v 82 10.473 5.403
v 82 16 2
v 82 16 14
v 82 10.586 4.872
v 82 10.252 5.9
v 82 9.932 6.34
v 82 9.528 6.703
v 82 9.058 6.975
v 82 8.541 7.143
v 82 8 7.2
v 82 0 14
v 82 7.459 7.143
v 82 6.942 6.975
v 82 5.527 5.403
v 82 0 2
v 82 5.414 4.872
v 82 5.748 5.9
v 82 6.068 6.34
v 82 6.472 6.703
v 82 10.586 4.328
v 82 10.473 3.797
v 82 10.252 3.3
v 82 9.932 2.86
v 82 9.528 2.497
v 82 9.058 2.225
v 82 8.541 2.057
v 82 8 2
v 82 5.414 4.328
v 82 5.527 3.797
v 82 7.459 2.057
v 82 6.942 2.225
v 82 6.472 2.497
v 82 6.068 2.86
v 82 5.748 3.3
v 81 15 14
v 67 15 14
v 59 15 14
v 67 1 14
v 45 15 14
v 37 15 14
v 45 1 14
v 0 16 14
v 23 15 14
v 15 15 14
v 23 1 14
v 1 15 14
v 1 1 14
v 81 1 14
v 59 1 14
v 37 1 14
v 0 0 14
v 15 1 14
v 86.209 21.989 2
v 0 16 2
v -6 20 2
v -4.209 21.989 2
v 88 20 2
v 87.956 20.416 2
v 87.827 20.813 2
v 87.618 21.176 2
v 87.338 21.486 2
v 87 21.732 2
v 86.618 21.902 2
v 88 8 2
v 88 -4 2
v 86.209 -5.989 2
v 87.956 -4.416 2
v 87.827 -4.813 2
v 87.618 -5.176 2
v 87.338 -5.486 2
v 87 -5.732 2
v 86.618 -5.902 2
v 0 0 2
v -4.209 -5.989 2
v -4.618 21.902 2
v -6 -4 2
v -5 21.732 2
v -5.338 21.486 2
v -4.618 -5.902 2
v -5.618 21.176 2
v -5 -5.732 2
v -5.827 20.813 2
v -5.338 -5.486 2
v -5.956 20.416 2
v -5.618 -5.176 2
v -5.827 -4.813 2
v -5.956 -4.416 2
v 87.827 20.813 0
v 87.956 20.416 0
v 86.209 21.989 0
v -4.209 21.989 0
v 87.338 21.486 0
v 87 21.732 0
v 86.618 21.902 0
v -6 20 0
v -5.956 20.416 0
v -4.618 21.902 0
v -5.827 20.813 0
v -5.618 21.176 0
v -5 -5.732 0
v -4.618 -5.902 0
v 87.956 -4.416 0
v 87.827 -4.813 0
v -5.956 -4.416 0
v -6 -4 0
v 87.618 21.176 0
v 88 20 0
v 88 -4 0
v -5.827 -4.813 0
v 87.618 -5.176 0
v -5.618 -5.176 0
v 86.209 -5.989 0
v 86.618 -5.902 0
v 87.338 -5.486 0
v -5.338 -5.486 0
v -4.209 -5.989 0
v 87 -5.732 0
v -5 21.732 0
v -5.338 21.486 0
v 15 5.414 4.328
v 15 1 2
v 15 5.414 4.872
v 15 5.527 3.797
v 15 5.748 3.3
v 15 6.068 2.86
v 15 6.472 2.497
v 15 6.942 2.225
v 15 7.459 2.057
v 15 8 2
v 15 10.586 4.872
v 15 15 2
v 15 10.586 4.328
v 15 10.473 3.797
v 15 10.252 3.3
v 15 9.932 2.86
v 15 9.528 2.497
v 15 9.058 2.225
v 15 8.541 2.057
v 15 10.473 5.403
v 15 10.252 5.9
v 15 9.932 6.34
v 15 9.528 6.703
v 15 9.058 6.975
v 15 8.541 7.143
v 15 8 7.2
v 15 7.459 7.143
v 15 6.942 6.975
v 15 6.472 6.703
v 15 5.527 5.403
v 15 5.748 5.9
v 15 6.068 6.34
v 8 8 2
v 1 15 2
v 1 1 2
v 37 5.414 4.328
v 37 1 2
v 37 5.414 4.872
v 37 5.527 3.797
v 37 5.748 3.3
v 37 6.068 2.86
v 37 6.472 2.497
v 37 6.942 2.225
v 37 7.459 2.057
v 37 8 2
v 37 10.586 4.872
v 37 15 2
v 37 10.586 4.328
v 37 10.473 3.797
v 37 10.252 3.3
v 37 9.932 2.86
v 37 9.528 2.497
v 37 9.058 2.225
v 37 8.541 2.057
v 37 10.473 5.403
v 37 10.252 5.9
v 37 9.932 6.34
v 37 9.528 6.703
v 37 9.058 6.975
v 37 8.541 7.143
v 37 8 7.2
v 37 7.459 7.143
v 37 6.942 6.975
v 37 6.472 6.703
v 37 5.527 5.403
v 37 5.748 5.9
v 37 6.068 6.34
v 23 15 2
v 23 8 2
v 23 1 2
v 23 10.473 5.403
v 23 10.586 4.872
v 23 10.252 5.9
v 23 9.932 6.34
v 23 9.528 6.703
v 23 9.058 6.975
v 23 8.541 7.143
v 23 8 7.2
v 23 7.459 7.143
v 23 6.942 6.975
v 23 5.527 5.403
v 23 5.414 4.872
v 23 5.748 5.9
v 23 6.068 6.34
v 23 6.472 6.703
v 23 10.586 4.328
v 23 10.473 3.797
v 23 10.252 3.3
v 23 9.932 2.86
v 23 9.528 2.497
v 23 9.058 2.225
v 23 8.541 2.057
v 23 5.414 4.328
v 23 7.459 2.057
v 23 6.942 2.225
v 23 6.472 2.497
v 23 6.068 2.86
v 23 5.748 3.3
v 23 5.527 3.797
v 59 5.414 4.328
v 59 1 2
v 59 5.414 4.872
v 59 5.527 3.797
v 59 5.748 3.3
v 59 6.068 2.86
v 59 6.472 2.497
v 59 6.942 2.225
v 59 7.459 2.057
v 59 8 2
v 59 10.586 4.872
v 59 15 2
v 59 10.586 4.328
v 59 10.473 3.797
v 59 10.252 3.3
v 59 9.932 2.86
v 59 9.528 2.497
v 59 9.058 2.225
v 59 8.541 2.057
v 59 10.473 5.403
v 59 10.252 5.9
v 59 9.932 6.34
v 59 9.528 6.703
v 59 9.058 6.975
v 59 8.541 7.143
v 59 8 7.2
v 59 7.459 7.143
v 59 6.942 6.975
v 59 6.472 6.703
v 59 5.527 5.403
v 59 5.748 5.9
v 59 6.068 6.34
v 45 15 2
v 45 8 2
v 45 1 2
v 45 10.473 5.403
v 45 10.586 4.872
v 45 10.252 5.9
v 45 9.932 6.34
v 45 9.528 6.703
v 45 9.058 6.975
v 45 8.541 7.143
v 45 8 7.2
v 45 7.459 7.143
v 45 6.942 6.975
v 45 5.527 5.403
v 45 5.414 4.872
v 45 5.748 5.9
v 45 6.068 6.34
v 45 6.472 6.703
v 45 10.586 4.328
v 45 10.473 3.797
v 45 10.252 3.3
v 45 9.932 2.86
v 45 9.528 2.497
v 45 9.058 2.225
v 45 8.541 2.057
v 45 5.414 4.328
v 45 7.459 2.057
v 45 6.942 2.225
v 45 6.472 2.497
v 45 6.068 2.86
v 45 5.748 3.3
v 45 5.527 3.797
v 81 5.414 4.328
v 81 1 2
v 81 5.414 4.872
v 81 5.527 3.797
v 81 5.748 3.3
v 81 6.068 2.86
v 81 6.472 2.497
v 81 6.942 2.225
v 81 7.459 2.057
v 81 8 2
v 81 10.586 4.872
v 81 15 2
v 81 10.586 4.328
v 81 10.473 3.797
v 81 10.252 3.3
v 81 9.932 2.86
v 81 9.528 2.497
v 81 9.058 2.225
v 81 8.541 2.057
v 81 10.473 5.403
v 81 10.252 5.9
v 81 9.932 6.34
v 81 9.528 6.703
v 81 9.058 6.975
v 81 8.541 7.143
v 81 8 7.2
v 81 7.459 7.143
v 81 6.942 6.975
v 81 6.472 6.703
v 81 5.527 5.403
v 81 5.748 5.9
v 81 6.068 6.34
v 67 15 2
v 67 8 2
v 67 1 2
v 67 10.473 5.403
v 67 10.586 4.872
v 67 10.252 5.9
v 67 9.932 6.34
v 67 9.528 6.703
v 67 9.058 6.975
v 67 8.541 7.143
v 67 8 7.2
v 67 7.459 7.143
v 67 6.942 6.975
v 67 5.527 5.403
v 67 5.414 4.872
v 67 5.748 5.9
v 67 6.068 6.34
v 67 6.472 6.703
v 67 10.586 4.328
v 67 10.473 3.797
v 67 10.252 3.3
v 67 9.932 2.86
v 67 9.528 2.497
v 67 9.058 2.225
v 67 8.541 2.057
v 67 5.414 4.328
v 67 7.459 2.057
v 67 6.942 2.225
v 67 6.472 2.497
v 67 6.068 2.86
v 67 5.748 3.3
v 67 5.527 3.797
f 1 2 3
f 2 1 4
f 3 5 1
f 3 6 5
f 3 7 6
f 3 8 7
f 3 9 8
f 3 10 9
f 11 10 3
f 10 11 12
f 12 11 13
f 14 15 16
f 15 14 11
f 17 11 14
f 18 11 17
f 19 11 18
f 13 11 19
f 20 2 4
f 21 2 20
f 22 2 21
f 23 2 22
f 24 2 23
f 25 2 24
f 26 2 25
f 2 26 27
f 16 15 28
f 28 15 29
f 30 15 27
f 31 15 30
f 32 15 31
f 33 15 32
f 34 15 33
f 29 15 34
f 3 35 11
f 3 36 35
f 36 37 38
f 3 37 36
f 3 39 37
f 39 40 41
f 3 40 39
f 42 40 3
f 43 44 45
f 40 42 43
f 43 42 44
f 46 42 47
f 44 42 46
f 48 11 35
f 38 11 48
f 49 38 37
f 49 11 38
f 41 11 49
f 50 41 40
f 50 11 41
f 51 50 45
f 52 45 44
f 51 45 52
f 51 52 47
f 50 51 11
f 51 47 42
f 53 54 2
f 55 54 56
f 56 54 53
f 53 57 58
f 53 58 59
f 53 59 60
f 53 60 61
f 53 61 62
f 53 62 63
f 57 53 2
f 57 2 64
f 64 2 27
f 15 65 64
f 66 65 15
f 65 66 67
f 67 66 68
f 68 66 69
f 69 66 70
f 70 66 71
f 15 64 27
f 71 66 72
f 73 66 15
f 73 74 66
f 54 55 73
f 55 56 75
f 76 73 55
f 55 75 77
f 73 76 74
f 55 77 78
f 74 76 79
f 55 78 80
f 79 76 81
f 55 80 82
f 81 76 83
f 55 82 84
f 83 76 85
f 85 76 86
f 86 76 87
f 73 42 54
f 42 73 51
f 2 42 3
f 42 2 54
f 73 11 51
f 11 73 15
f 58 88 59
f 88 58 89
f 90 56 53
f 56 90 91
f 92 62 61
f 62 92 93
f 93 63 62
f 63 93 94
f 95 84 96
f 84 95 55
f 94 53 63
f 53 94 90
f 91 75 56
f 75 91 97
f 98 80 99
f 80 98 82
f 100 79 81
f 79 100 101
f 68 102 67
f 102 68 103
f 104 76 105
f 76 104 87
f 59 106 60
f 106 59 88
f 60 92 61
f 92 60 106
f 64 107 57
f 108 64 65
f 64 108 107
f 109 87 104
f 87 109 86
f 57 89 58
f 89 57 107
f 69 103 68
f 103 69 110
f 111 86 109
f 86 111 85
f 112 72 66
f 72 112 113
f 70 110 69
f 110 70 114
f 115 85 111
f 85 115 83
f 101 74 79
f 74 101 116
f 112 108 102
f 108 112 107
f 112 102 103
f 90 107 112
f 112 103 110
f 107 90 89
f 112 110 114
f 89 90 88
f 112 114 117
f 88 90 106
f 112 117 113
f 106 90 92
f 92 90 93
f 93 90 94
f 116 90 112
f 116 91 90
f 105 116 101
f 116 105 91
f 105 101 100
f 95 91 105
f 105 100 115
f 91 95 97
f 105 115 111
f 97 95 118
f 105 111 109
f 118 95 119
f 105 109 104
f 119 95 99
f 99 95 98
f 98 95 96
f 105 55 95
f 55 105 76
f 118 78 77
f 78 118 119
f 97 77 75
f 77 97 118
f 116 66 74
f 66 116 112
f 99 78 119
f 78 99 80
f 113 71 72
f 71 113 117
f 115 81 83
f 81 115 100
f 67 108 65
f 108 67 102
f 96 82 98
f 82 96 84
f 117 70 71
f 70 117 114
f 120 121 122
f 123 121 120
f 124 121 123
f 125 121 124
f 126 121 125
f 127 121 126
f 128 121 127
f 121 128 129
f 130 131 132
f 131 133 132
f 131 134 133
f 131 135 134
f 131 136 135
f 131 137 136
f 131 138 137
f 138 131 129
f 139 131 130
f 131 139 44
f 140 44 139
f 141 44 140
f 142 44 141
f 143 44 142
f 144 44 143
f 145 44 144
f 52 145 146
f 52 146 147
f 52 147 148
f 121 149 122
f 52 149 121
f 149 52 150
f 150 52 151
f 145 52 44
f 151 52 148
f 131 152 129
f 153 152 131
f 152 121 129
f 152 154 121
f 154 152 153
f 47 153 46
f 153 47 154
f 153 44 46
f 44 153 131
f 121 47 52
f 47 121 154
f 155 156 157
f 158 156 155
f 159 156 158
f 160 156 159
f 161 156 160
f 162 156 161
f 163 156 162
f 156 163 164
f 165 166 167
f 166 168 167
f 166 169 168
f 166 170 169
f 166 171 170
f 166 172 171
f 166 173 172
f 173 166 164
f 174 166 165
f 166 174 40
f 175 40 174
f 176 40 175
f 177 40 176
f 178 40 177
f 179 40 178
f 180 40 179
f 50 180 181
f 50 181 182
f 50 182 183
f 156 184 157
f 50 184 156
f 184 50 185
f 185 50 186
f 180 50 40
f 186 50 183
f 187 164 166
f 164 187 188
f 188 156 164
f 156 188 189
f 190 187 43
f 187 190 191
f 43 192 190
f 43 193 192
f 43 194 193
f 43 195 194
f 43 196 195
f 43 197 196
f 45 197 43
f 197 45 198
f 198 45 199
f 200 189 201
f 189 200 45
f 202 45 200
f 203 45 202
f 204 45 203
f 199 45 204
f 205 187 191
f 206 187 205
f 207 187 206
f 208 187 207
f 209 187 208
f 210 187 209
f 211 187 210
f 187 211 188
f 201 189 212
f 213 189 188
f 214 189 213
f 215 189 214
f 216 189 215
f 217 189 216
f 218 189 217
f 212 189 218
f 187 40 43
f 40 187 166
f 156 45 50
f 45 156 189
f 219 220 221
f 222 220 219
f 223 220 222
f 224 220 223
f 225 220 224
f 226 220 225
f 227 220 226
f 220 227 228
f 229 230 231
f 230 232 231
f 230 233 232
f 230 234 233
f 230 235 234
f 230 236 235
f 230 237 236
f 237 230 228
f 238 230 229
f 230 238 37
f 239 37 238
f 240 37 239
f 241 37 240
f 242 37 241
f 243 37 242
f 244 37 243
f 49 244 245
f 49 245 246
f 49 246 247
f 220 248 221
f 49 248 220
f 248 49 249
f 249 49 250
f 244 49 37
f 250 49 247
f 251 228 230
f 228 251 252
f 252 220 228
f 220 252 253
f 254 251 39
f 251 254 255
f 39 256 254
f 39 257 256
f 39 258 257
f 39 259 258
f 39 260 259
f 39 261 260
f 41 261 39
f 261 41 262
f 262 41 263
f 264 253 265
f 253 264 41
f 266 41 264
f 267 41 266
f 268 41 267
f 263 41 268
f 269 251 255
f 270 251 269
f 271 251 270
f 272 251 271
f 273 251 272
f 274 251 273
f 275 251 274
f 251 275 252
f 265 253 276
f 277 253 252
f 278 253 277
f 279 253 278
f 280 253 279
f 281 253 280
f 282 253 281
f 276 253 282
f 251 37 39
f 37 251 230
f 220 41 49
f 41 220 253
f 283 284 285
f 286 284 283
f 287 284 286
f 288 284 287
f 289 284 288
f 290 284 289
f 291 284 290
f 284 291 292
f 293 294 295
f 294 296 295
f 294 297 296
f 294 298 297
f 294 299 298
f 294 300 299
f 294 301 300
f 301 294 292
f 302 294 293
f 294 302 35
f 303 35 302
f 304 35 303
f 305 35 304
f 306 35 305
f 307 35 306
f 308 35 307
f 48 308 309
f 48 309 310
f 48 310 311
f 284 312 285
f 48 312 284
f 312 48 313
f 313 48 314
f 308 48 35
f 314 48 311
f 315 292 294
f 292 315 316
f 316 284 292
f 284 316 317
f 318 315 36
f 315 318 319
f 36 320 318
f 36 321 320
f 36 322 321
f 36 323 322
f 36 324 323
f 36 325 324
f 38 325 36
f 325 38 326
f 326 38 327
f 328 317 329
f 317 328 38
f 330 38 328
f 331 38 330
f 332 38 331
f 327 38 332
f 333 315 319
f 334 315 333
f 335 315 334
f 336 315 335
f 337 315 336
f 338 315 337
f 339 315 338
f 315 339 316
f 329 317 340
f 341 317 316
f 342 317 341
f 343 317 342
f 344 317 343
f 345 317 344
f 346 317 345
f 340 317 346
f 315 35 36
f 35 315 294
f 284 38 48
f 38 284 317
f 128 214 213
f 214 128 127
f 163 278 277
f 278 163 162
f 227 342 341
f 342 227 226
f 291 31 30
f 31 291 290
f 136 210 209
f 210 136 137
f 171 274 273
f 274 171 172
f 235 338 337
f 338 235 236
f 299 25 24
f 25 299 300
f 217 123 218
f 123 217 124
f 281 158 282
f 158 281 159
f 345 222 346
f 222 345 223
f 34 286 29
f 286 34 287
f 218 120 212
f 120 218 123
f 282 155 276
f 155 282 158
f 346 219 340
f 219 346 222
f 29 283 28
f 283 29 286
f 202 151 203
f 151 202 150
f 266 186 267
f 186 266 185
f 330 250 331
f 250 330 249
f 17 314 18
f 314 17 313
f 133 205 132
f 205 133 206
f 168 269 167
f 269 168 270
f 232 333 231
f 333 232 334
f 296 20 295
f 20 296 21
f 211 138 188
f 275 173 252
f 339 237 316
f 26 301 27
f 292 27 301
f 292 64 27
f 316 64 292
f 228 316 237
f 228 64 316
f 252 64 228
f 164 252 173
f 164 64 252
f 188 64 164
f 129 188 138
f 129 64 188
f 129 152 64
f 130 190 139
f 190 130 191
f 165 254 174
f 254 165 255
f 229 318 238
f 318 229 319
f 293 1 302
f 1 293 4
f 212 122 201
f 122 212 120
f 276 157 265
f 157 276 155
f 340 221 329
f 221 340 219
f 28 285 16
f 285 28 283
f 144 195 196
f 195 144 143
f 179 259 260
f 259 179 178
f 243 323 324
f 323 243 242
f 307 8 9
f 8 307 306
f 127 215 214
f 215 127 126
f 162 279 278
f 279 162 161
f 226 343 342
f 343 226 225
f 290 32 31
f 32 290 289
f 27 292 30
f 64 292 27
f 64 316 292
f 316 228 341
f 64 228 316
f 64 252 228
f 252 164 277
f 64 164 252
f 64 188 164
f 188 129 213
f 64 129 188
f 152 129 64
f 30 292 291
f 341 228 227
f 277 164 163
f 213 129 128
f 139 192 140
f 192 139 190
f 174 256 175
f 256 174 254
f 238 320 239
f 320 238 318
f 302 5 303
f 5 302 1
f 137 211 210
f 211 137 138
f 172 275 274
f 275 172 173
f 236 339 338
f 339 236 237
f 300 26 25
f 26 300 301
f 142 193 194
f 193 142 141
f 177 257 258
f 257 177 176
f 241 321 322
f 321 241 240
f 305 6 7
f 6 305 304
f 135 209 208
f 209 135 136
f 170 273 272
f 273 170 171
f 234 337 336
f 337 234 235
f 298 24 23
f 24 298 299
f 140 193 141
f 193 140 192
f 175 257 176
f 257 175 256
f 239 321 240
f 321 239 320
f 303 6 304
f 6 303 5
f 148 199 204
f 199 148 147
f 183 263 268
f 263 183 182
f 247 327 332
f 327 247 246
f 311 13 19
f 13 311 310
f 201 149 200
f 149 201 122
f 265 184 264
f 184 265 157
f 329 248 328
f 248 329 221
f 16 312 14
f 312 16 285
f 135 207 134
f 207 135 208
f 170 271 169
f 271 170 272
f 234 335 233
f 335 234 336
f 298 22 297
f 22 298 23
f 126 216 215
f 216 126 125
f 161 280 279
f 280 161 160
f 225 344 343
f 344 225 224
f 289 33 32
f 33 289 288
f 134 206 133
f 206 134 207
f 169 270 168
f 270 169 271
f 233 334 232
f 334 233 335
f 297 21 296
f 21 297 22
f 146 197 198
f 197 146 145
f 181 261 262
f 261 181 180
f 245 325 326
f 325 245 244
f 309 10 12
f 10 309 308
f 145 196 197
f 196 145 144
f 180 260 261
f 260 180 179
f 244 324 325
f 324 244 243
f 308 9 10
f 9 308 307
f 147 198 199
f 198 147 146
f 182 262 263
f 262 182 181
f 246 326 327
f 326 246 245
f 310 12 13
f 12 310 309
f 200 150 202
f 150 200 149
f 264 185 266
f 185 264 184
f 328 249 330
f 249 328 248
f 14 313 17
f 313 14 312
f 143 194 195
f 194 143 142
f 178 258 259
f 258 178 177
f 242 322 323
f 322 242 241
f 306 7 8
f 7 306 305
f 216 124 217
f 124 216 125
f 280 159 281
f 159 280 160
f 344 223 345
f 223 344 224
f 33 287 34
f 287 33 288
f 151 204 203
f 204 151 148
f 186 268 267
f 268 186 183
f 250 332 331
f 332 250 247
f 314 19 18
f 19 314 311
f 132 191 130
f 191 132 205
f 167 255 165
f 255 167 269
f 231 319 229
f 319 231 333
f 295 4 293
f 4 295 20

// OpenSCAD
// curved segment size
$fs = 0.3;

wall_thickness = 1;
hole_diameter = 5.2;
hole_radius = hole_diameter/2;
switch_base_size = 14;
switch_count = 4;
switch_hole_depth = 9.5;
base_height = 12;
skirt_height = 2;
skirt_offset = 6;
skirt_radius = 2;
switch_spacing = 6;


base_y = (switch_base_size + (wall_thickness * 2));
base_x = ((switch_base_size + (wall_thickness * 2)) * switch_count) + (switch_spacing * (switch_count - 1));
switch_padding = ((switch_base_size + (wall_thickness * 2)) - switch_base_size);

// base
module base() {
  translate([0 - (switch_padding/2), 0 - (switch_padding/2), 0]) {
    cube([base_x,base_y,base_height], false);
  }
}

// switch holes
module switch_holes() {
  for(i = [0:switch_count-1]) {
    translate([i * (switch_base_size + (wall_thickness * 2) + switch_spacing), 0, 0]) {
      cube(switch_base_size, false);
    }
  }
}

module skirt(offset, height, radius) {
  offset = (offset * 2) - (radius * 2);
  translate([0 - (switch_padding/2) - (offset/2), 0 - (switch_padding/2) - (offset/2), 0]) {
    linear_extrude(height) {
      minkowski() {
        square([base_x + offset, base_y + offset], false);
        circle(r = radius, center = true);
      }
    }
  }
}

// assembly
translate([switch_padding/2, switch_padding/2, 0]) {
  difference() {
    union() {
      translate([0, 0, skirt_height]) {
        base();
      }
      skirt(skirt_offset, skirt_height, skirt_radius);
    }
    translate([0, 0, skirt_height]) {
      switch_holes();
    }
    translate([(base_x/2) + switch_base_size/2, (base_y/2) - (switch_padding/2), skirt_height + hole_radius]) {
      rotate([0, 90, 0]) {
        cylinder(h = base_x, d = hole_diameter, center = true);
      }
    }
  }
}
